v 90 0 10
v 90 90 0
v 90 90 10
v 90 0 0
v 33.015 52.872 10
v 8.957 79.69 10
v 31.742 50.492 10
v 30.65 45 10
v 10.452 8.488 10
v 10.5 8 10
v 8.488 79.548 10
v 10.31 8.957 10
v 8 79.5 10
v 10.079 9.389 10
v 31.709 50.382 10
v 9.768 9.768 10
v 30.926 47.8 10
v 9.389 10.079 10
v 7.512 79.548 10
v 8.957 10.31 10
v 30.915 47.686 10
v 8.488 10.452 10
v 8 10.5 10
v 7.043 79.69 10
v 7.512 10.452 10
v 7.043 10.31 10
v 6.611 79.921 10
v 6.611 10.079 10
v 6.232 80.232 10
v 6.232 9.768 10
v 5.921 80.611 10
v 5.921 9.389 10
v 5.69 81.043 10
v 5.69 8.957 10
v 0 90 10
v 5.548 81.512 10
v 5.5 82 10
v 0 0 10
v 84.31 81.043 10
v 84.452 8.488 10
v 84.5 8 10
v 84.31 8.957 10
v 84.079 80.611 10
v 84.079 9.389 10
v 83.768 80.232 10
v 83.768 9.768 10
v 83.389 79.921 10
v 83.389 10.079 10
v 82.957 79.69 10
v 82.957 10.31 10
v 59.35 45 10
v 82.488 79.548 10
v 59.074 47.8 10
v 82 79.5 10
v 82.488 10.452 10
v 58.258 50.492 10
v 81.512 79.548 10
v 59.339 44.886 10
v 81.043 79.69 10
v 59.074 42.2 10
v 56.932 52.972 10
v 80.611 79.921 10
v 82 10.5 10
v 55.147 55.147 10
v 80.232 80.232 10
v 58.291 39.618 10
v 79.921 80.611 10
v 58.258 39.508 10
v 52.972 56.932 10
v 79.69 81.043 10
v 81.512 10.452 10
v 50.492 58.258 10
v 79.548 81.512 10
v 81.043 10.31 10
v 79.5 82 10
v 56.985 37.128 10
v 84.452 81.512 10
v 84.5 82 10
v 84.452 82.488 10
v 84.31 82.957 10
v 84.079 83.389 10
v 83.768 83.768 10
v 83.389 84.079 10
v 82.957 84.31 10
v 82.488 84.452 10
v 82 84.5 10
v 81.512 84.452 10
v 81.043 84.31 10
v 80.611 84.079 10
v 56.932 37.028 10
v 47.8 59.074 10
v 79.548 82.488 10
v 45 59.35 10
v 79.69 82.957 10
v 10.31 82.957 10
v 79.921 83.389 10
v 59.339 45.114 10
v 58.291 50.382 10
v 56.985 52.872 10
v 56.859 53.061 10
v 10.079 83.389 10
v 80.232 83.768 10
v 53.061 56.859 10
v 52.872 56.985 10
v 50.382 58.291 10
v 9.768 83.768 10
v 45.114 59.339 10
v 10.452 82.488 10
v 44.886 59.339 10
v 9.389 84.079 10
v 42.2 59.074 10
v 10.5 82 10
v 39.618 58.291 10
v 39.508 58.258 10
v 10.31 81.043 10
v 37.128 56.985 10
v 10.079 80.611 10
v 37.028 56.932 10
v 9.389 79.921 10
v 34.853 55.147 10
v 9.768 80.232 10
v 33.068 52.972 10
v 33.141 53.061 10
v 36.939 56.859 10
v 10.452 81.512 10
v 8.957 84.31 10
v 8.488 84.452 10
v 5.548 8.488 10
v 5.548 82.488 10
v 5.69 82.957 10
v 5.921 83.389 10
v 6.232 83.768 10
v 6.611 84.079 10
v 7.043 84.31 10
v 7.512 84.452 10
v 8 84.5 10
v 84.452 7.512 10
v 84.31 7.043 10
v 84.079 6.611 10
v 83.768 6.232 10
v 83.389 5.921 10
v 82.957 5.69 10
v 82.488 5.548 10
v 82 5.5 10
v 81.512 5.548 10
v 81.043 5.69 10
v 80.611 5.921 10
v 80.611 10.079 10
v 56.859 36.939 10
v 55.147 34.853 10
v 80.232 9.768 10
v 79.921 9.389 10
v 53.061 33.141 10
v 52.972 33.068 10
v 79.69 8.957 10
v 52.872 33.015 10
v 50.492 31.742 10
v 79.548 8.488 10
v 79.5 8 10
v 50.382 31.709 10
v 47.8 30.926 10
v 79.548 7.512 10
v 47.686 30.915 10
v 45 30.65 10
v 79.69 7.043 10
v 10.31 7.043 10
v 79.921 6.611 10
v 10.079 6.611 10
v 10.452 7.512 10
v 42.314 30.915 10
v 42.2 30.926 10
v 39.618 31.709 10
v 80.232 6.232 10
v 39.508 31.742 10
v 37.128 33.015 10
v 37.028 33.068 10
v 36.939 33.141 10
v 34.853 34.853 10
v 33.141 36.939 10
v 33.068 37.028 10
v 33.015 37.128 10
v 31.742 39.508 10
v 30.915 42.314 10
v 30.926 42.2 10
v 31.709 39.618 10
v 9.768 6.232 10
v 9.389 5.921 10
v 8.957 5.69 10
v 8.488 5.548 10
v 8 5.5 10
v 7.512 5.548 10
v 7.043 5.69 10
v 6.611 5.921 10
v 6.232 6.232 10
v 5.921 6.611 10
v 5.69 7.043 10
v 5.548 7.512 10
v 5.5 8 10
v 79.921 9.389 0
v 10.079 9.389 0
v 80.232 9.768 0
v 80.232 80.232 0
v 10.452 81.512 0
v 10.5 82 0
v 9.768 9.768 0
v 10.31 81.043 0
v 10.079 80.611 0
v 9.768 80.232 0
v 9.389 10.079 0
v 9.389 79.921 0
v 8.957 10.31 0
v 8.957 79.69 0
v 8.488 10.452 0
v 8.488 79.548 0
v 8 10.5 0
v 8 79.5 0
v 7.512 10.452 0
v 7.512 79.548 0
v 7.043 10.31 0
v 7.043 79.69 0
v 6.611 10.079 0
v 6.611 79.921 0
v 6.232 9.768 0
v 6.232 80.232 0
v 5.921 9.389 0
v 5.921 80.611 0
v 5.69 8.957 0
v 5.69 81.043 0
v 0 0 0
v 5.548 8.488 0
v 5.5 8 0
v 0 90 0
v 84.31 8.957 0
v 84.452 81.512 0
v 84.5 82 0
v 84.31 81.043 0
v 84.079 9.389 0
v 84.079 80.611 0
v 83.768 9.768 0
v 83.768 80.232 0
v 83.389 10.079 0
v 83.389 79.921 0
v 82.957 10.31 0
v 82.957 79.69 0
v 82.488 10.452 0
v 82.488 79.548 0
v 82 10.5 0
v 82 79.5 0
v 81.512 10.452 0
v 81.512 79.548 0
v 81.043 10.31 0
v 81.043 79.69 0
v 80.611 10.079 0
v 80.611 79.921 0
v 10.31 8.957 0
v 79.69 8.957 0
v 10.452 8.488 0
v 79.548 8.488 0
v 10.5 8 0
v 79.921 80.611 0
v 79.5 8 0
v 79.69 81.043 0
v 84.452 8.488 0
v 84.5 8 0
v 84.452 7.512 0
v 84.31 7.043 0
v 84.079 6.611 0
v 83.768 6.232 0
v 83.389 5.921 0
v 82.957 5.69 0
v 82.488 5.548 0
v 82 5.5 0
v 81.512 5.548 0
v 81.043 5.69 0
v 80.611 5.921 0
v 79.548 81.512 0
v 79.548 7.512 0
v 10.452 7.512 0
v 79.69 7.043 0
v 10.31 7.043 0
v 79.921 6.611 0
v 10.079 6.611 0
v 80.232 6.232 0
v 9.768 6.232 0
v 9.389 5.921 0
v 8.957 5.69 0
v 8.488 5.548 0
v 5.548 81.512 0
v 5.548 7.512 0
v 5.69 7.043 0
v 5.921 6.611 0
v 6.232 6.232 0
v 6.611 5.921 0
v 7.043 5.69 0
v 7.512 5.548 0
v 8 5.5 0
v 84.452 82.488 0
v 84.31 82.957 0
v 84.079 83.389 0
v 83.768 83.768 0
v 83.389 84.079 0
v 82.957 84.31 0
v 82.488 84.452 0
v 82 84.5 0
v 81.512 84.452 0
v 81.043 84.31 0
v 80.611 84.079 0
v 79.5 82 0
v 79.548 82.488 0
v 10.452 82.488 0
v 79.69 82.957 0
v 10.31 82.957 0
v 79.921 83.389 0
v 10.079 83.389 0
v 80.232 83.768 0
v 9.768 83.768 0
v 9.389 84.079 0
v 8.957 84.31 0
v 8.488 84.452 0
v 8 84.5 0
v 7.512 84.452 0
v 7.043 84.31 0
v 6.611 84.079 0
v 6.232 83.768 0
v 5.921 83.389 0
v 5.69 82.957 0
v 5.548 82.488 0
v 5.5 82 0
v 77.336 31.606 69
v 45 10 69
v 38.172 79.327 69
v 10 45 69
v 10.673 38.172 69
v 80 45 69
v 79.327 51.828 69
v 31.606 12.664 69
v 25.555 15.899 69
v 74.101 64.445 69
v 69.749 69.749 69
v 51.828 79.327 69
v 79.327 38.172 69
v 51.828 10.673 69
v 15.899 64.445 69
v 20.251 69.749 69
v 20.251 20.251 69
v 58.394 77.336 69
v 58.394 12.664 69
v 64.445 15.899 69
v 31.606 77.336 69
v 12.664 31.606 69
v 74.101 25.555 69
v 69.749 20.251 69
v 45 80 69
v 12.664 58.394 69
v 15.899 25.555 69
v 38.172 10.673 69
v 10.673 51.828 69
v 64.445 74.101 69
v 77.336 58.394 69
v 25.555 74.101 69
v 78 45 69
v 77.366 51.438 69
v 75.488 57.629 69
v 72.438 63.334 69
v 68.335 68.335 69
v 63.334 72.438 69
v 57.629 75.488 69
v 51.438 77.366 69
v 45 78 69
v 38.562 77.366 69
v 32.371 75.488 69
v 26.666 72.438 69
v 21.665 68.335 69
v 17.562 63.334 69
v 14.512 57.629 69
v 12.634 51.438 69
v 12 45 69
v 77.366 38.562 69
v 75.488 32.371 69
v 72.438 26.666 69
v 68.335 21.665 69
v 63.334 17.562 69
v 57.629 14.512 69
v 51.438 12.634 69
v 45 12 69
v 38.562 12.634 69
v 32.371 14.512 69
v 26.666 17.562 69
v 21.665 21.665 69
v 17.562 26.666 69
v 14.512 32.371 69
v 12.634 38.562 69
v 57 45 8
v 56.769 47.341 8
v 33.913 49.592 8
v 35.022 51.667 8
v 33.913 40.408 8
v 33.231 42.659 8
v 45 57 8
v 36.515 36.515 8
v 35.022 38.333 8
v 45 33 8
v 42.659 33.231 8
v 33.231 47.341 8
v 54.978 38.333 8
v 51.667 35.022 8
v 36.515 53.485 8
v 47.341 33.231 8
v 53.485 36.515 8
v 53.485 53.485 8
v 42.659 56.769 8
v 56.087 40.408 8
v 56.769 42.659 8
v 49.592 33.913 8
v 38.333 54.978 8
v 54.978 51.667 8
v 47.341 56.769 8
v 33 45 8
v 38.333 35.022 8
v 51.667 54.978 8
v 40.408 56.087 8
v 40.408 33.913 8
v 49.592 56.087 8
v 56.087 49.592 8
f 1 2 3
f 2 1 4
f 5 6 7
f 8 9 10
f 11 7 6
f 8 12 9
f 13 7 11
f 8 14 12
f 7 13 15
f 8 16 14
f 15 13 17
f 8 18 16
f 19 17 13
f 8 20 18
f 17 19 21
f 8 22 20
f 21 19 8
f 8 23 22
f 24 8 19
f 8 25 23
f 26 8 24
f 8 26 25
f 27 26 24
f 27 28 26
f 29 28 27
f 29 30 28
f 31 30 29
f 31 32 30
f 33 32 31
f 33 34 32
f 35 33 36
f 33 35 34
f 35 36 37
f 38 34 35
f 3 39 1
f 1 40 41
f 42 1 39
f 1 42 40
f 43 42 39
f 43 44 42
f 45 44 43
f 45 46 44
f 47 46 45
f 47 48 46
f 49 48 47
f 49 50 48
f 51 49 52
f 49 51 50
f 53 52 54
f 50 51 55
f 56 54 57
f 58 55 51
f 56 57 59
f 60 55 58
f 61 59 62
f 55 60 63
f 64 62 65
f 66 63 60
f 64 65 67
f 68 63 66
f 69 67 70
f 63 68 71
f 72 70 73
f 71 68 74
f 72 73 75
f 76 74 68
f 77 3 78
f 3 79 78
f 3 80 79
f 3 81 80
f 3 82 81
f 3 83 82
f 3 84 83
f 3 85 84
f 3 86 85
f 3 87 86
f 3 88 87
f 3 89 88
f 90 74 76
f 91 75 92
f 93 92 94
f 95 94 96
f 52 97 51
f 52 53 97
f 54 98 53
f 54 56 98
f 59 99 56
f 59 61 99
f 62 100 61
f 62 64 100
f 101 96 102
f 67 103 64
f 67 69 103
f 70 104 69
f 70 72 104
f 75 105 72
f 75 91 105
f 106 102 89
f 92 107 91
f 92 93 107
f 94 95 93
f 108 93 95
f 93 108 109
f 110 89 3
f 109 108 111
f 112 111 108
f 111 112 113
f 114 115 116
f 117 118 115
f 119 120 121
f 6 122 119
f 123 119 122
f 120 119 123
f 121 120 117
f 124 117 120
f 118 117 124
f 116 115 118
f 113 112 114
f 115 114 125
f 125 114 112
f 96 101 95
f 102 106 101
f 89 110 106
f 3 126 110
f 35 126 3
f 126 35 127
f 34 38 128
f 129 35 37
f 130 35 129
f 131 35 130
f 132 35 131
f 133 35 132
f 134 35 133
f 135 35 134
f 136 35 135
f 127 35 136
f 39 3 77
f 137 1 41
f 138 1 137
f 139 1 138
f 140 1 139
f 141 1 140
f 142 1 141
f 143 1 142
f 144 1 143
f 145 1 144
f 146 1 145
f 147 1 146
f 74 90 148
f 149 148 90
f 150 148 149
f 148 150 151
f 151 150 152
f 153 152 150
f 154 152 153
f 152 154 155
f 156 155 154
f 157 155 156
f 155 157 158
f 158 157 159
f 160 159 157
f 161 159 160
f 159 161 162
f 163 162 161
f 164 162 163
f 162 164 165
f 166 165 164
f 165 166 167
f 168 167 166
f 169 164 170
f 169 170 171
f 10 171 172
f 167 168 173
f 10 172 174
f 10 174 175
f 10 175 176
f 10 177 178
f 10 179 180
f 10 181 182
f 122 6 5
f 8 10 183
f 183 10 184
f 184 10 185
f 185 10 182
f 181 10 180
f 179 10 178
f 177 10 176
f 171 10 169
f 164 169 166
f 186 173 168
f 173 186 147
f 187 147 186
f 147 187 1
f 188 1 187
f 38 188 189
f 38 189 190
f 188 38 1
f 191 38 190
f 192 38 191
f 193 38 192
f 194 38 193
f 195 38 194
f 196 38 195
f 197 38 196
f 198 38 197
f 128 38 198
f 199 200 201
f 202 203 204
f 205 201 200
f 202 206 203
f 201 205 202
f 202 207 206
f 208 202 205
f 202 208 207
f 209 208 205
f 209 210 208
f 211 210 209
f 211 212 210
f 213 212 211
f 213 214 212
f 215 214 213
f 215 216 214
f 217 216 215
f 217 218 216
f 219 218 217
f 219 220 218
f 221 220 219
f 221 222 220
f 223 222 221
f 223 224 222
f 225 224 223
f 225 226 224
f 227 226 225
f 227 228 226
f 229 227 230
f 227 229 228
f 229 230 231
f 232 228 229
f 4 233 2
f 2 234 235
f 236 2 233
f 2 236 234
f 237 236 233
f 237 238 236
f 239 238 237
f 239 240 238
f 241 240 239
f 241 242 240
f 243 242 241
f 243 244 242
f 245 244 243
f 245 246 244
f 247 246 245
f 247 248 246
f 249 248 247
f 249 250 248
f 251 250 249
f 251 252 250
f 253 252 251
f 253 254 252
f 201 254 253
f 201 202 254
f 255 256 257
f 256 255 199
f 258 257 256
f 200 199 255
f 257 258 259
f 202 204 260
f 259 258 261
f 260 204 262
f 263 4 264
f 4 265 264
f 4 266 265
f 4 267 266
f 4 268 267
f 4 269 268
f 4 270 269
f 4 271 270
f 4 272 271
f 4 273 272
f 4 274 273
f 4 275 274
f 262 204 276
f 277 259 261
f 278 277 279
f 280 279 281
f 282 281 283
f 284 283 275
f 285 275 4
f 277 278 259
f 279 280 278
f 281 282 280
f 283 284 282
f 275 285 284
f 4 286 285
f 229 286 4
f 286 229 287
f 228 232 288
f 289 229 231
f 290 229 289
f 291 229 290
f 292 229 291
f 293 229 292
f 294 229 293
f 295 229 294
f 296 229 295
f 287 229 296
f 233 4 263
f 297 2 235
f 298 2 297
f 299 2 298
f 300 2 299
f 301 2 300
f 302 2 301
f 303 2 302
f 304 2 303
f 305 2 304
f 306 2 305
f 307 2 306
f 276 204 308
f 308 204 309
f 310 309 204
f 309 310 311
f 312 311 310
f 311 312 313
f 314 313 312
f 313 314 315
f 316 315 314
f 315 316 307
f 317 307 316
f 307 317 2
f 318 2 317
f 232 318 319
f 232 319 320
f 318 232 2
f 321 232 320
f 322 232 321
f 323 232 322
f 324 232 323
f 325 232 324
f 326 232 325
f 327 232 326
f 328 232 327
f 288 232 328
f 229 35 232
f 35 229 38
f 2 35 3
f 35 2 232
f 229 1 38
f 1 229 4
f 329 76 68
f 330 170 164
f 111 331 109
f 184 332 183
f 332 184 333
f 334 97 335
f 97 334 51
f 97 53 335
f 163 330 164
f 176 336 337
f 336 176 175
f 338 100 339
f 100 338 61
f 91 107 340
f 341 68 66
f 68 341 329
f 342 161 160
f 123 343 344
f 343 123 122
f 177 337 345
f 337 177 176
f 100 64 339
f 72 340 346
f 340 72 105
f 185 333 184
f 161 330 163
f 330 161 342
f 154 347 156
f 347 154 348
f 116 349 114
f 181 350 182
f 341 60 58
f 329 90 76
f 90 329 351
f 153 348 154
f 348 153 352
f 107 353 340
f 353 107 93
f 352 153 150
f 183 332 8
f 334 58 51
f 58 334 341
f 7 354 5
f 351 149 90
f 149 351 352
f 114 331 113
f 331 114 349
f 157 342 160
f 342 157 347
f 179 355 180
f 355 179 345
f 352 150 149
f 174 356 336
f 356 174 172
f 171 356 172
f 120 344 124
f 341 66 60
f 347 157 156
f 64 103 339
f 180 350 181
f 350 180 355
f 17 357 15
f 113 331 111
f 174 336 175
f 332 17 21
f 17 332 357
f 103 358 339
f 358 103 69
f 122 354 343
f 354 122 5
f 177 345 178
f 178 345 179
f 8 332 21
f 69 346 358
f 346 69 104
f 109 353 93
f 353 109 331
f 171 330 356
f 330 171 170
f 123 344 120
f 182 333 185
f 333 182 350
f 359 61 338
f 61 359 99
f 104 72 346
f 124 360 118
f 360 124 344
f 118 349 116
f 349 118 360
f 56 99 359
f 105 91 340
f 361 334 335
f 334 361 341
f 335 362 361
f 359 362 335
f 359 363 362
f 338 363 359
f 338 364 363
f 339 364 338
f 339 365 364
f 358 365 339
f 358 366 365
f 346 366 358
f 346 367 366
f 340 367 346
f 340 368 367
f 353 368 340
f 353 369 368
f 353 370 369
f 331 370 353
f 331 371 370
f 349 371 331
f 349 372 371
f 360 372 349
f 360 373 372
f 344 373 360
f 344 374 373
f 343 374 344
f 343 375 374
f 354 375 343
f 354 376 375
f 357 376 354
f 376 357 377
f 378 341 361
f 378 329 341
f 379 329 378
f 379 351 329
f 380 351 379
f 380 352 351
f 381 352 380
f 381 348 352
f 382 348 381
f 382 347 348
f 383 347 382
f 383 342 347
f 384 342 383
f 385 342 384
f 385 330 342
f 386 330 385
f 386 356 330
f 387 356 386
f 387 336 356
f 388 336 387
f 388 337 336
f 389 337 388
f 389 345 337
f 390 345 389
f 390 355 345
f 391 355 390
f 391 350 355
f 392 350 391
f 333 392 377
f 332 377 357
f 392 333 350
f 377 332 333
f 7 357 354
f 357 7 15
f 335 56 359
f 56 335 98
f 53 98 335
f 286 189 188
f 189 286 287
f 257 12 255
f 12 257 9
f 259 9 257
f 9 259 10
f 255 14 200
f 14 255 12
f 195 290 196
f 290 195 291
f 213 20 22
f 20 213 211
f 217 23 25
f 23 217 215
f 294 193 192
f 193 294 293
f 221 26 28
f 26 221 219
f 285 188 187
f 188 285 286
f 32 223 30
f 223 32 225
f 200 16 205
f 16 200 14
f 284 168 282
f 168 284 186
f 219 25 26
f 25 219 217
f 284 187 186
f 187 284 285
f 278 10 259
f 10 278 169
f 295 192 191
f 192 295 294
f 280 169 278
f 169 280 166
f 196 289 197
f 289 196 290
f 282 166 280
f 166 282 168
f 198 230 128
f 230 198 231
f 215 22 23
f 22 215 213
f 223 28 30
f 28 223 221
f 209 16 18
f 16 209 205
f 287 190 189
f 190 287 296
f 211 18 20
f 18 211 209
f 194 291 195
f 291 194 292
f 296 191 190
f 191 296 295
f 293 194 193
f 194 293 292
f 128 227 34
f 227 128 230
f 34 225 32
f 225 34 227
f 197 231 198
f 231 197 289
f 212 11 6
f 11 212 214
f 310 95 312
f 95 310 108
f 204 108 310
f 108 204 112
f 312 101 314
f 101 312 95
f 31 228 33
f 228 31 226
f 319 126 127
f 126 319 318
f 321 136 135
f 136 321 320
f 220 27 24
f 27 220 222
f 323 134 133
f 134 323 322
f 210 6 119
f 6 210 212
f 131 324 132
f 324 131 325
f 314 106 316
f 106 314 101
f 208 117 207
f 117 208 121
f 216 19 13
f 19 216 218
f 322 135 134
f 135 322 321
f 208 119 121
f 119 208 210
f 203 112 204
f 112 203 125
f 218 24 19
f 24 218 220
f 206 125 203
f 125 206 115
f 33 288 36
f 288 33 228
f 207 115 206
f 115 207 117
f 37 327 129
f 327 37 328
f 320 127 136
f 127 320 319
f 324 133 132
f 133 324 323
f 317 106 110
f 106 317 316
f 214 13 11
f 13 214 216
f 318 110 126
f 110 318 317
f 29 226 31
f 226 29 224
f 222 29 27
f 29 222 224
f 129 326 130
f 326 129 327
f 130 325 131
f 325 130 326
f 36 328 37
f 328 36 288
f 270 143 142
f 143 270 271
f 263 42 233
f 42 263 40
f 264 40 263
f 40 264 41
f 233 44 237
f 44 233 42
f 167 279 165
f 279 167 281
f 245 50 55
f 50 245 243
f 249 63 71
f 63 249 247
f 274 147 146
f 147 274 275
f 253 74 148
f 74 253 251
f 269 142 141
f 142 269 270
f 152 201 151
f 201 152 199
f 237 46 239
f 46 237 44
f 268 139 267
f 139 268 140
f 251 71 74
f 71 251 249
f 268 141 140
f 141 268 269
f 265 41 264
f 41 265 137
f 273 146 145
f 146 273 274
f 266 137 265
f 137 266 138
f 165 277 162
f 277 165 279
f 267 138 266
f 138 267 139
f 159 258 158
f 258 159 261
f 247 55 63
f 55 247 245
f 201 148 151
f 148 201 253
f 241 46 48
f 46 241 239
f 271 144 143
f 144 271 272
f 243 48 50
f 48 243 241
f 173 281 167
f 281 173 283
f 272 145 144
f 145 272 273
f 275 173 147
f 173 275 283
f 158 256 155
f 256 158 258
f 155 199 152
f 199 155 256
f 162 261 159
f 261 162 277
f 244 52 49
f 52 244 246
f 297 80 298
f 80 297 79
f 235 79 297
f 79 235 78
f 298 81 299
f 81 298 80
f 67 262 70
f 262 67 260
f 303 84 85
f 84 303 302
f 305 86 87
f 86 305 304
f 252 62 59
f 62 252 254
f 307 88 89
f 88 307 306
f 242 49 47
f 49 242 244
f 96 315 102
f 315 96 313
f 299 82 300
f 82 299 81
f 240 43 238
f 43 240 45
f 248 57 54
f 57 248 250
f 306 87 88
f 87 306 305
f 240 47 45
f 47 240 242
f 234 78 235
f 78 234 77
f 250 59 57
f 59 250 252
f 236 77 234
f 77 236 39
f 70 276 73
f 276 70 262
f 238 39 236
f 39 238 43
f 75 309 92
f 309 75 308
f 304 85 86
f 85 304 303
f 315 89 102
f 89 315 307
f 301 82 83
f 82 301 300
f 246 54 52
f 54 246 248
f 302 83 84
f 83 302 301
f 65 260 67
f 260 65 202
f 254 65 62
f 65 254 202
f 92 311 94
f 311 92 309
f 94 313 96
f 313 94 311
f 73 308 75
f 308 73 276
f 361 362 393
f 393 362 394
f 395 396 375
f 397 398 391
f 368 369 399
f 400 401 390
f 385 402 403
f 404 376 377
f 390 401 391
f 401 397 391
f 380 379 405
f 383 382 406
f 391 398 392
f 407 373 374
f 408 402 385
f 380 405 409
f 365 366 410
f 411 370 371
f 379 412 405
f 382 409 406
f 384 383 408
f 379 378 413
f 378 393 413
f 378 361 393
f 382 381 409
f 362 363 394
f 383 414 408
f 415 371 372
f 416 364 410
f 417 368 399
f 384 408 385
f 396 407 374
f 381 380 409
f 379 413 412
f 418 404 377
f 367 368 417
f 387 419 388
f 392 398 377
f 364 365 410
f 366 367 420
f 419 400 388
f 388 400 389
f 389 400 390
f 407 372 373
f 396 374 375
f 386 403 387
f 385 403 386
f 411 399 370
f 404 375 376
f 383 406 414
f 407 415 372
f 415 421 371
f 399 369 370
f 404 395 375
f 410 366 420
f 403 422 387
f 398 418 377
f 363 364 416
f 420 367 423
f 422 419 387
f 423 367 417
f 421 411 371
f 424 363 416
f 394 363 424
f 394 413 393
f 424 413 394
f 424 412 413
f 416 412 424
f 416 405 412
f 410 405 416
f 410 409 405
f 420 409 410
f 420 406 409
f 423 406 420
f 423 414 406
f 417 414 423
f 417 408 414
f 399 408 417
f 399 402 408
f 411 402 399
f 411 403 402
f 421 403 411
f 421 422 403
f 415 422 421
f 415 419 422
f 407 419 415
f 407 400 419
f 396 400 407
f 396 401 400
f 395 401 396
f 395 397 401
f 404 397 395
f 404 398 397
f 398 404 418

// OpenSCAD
$fn = 32;

// ----------------------------------------------------------------------
// Hopper: flanged with square flange
// ----------------------------------------------------------------------

// --- parameters (mm) ---
fl = 90;                  // flange side, X and Y
fl_t = 10;                // flange thickness
cone_h = 60;              // cone height above the flange
top_d = 70;               // cone mouth diameter
bot_d = 28;               // cone spout diameter
wall = 2;                 // cone wall thickness
hole_r = 2.5;             // flange hole radius
hole_in = 8;              // hole inset from the corners

bore_d = bot_d - 2 * wall;  // spout bore diameter
total_h = fl_t + cone_h - 1;  // overall height

difference() {
  union() {
    cube([fl, fl, fl_t]);
    translate([fl / 2, fl / 2, fl_t - 1])
      cylinder(h = cone_h, d1 = bot_d, d2 = top_d);
  }
  translate([fl / 2, fl / 2, fl_t - 2])
    cylinder(h = cone_h + 1, d1 = bore_d, d2 = top_d - 2 * wall);
  for (sx = [0, 1], sy = [0, 1])
    translate([sx ? fl - hole_in : hole_in,
               sy ? fl - hole_in : hole_in, -1])
      cylinder(r = hole_r, h = fl_t + 2);
}
